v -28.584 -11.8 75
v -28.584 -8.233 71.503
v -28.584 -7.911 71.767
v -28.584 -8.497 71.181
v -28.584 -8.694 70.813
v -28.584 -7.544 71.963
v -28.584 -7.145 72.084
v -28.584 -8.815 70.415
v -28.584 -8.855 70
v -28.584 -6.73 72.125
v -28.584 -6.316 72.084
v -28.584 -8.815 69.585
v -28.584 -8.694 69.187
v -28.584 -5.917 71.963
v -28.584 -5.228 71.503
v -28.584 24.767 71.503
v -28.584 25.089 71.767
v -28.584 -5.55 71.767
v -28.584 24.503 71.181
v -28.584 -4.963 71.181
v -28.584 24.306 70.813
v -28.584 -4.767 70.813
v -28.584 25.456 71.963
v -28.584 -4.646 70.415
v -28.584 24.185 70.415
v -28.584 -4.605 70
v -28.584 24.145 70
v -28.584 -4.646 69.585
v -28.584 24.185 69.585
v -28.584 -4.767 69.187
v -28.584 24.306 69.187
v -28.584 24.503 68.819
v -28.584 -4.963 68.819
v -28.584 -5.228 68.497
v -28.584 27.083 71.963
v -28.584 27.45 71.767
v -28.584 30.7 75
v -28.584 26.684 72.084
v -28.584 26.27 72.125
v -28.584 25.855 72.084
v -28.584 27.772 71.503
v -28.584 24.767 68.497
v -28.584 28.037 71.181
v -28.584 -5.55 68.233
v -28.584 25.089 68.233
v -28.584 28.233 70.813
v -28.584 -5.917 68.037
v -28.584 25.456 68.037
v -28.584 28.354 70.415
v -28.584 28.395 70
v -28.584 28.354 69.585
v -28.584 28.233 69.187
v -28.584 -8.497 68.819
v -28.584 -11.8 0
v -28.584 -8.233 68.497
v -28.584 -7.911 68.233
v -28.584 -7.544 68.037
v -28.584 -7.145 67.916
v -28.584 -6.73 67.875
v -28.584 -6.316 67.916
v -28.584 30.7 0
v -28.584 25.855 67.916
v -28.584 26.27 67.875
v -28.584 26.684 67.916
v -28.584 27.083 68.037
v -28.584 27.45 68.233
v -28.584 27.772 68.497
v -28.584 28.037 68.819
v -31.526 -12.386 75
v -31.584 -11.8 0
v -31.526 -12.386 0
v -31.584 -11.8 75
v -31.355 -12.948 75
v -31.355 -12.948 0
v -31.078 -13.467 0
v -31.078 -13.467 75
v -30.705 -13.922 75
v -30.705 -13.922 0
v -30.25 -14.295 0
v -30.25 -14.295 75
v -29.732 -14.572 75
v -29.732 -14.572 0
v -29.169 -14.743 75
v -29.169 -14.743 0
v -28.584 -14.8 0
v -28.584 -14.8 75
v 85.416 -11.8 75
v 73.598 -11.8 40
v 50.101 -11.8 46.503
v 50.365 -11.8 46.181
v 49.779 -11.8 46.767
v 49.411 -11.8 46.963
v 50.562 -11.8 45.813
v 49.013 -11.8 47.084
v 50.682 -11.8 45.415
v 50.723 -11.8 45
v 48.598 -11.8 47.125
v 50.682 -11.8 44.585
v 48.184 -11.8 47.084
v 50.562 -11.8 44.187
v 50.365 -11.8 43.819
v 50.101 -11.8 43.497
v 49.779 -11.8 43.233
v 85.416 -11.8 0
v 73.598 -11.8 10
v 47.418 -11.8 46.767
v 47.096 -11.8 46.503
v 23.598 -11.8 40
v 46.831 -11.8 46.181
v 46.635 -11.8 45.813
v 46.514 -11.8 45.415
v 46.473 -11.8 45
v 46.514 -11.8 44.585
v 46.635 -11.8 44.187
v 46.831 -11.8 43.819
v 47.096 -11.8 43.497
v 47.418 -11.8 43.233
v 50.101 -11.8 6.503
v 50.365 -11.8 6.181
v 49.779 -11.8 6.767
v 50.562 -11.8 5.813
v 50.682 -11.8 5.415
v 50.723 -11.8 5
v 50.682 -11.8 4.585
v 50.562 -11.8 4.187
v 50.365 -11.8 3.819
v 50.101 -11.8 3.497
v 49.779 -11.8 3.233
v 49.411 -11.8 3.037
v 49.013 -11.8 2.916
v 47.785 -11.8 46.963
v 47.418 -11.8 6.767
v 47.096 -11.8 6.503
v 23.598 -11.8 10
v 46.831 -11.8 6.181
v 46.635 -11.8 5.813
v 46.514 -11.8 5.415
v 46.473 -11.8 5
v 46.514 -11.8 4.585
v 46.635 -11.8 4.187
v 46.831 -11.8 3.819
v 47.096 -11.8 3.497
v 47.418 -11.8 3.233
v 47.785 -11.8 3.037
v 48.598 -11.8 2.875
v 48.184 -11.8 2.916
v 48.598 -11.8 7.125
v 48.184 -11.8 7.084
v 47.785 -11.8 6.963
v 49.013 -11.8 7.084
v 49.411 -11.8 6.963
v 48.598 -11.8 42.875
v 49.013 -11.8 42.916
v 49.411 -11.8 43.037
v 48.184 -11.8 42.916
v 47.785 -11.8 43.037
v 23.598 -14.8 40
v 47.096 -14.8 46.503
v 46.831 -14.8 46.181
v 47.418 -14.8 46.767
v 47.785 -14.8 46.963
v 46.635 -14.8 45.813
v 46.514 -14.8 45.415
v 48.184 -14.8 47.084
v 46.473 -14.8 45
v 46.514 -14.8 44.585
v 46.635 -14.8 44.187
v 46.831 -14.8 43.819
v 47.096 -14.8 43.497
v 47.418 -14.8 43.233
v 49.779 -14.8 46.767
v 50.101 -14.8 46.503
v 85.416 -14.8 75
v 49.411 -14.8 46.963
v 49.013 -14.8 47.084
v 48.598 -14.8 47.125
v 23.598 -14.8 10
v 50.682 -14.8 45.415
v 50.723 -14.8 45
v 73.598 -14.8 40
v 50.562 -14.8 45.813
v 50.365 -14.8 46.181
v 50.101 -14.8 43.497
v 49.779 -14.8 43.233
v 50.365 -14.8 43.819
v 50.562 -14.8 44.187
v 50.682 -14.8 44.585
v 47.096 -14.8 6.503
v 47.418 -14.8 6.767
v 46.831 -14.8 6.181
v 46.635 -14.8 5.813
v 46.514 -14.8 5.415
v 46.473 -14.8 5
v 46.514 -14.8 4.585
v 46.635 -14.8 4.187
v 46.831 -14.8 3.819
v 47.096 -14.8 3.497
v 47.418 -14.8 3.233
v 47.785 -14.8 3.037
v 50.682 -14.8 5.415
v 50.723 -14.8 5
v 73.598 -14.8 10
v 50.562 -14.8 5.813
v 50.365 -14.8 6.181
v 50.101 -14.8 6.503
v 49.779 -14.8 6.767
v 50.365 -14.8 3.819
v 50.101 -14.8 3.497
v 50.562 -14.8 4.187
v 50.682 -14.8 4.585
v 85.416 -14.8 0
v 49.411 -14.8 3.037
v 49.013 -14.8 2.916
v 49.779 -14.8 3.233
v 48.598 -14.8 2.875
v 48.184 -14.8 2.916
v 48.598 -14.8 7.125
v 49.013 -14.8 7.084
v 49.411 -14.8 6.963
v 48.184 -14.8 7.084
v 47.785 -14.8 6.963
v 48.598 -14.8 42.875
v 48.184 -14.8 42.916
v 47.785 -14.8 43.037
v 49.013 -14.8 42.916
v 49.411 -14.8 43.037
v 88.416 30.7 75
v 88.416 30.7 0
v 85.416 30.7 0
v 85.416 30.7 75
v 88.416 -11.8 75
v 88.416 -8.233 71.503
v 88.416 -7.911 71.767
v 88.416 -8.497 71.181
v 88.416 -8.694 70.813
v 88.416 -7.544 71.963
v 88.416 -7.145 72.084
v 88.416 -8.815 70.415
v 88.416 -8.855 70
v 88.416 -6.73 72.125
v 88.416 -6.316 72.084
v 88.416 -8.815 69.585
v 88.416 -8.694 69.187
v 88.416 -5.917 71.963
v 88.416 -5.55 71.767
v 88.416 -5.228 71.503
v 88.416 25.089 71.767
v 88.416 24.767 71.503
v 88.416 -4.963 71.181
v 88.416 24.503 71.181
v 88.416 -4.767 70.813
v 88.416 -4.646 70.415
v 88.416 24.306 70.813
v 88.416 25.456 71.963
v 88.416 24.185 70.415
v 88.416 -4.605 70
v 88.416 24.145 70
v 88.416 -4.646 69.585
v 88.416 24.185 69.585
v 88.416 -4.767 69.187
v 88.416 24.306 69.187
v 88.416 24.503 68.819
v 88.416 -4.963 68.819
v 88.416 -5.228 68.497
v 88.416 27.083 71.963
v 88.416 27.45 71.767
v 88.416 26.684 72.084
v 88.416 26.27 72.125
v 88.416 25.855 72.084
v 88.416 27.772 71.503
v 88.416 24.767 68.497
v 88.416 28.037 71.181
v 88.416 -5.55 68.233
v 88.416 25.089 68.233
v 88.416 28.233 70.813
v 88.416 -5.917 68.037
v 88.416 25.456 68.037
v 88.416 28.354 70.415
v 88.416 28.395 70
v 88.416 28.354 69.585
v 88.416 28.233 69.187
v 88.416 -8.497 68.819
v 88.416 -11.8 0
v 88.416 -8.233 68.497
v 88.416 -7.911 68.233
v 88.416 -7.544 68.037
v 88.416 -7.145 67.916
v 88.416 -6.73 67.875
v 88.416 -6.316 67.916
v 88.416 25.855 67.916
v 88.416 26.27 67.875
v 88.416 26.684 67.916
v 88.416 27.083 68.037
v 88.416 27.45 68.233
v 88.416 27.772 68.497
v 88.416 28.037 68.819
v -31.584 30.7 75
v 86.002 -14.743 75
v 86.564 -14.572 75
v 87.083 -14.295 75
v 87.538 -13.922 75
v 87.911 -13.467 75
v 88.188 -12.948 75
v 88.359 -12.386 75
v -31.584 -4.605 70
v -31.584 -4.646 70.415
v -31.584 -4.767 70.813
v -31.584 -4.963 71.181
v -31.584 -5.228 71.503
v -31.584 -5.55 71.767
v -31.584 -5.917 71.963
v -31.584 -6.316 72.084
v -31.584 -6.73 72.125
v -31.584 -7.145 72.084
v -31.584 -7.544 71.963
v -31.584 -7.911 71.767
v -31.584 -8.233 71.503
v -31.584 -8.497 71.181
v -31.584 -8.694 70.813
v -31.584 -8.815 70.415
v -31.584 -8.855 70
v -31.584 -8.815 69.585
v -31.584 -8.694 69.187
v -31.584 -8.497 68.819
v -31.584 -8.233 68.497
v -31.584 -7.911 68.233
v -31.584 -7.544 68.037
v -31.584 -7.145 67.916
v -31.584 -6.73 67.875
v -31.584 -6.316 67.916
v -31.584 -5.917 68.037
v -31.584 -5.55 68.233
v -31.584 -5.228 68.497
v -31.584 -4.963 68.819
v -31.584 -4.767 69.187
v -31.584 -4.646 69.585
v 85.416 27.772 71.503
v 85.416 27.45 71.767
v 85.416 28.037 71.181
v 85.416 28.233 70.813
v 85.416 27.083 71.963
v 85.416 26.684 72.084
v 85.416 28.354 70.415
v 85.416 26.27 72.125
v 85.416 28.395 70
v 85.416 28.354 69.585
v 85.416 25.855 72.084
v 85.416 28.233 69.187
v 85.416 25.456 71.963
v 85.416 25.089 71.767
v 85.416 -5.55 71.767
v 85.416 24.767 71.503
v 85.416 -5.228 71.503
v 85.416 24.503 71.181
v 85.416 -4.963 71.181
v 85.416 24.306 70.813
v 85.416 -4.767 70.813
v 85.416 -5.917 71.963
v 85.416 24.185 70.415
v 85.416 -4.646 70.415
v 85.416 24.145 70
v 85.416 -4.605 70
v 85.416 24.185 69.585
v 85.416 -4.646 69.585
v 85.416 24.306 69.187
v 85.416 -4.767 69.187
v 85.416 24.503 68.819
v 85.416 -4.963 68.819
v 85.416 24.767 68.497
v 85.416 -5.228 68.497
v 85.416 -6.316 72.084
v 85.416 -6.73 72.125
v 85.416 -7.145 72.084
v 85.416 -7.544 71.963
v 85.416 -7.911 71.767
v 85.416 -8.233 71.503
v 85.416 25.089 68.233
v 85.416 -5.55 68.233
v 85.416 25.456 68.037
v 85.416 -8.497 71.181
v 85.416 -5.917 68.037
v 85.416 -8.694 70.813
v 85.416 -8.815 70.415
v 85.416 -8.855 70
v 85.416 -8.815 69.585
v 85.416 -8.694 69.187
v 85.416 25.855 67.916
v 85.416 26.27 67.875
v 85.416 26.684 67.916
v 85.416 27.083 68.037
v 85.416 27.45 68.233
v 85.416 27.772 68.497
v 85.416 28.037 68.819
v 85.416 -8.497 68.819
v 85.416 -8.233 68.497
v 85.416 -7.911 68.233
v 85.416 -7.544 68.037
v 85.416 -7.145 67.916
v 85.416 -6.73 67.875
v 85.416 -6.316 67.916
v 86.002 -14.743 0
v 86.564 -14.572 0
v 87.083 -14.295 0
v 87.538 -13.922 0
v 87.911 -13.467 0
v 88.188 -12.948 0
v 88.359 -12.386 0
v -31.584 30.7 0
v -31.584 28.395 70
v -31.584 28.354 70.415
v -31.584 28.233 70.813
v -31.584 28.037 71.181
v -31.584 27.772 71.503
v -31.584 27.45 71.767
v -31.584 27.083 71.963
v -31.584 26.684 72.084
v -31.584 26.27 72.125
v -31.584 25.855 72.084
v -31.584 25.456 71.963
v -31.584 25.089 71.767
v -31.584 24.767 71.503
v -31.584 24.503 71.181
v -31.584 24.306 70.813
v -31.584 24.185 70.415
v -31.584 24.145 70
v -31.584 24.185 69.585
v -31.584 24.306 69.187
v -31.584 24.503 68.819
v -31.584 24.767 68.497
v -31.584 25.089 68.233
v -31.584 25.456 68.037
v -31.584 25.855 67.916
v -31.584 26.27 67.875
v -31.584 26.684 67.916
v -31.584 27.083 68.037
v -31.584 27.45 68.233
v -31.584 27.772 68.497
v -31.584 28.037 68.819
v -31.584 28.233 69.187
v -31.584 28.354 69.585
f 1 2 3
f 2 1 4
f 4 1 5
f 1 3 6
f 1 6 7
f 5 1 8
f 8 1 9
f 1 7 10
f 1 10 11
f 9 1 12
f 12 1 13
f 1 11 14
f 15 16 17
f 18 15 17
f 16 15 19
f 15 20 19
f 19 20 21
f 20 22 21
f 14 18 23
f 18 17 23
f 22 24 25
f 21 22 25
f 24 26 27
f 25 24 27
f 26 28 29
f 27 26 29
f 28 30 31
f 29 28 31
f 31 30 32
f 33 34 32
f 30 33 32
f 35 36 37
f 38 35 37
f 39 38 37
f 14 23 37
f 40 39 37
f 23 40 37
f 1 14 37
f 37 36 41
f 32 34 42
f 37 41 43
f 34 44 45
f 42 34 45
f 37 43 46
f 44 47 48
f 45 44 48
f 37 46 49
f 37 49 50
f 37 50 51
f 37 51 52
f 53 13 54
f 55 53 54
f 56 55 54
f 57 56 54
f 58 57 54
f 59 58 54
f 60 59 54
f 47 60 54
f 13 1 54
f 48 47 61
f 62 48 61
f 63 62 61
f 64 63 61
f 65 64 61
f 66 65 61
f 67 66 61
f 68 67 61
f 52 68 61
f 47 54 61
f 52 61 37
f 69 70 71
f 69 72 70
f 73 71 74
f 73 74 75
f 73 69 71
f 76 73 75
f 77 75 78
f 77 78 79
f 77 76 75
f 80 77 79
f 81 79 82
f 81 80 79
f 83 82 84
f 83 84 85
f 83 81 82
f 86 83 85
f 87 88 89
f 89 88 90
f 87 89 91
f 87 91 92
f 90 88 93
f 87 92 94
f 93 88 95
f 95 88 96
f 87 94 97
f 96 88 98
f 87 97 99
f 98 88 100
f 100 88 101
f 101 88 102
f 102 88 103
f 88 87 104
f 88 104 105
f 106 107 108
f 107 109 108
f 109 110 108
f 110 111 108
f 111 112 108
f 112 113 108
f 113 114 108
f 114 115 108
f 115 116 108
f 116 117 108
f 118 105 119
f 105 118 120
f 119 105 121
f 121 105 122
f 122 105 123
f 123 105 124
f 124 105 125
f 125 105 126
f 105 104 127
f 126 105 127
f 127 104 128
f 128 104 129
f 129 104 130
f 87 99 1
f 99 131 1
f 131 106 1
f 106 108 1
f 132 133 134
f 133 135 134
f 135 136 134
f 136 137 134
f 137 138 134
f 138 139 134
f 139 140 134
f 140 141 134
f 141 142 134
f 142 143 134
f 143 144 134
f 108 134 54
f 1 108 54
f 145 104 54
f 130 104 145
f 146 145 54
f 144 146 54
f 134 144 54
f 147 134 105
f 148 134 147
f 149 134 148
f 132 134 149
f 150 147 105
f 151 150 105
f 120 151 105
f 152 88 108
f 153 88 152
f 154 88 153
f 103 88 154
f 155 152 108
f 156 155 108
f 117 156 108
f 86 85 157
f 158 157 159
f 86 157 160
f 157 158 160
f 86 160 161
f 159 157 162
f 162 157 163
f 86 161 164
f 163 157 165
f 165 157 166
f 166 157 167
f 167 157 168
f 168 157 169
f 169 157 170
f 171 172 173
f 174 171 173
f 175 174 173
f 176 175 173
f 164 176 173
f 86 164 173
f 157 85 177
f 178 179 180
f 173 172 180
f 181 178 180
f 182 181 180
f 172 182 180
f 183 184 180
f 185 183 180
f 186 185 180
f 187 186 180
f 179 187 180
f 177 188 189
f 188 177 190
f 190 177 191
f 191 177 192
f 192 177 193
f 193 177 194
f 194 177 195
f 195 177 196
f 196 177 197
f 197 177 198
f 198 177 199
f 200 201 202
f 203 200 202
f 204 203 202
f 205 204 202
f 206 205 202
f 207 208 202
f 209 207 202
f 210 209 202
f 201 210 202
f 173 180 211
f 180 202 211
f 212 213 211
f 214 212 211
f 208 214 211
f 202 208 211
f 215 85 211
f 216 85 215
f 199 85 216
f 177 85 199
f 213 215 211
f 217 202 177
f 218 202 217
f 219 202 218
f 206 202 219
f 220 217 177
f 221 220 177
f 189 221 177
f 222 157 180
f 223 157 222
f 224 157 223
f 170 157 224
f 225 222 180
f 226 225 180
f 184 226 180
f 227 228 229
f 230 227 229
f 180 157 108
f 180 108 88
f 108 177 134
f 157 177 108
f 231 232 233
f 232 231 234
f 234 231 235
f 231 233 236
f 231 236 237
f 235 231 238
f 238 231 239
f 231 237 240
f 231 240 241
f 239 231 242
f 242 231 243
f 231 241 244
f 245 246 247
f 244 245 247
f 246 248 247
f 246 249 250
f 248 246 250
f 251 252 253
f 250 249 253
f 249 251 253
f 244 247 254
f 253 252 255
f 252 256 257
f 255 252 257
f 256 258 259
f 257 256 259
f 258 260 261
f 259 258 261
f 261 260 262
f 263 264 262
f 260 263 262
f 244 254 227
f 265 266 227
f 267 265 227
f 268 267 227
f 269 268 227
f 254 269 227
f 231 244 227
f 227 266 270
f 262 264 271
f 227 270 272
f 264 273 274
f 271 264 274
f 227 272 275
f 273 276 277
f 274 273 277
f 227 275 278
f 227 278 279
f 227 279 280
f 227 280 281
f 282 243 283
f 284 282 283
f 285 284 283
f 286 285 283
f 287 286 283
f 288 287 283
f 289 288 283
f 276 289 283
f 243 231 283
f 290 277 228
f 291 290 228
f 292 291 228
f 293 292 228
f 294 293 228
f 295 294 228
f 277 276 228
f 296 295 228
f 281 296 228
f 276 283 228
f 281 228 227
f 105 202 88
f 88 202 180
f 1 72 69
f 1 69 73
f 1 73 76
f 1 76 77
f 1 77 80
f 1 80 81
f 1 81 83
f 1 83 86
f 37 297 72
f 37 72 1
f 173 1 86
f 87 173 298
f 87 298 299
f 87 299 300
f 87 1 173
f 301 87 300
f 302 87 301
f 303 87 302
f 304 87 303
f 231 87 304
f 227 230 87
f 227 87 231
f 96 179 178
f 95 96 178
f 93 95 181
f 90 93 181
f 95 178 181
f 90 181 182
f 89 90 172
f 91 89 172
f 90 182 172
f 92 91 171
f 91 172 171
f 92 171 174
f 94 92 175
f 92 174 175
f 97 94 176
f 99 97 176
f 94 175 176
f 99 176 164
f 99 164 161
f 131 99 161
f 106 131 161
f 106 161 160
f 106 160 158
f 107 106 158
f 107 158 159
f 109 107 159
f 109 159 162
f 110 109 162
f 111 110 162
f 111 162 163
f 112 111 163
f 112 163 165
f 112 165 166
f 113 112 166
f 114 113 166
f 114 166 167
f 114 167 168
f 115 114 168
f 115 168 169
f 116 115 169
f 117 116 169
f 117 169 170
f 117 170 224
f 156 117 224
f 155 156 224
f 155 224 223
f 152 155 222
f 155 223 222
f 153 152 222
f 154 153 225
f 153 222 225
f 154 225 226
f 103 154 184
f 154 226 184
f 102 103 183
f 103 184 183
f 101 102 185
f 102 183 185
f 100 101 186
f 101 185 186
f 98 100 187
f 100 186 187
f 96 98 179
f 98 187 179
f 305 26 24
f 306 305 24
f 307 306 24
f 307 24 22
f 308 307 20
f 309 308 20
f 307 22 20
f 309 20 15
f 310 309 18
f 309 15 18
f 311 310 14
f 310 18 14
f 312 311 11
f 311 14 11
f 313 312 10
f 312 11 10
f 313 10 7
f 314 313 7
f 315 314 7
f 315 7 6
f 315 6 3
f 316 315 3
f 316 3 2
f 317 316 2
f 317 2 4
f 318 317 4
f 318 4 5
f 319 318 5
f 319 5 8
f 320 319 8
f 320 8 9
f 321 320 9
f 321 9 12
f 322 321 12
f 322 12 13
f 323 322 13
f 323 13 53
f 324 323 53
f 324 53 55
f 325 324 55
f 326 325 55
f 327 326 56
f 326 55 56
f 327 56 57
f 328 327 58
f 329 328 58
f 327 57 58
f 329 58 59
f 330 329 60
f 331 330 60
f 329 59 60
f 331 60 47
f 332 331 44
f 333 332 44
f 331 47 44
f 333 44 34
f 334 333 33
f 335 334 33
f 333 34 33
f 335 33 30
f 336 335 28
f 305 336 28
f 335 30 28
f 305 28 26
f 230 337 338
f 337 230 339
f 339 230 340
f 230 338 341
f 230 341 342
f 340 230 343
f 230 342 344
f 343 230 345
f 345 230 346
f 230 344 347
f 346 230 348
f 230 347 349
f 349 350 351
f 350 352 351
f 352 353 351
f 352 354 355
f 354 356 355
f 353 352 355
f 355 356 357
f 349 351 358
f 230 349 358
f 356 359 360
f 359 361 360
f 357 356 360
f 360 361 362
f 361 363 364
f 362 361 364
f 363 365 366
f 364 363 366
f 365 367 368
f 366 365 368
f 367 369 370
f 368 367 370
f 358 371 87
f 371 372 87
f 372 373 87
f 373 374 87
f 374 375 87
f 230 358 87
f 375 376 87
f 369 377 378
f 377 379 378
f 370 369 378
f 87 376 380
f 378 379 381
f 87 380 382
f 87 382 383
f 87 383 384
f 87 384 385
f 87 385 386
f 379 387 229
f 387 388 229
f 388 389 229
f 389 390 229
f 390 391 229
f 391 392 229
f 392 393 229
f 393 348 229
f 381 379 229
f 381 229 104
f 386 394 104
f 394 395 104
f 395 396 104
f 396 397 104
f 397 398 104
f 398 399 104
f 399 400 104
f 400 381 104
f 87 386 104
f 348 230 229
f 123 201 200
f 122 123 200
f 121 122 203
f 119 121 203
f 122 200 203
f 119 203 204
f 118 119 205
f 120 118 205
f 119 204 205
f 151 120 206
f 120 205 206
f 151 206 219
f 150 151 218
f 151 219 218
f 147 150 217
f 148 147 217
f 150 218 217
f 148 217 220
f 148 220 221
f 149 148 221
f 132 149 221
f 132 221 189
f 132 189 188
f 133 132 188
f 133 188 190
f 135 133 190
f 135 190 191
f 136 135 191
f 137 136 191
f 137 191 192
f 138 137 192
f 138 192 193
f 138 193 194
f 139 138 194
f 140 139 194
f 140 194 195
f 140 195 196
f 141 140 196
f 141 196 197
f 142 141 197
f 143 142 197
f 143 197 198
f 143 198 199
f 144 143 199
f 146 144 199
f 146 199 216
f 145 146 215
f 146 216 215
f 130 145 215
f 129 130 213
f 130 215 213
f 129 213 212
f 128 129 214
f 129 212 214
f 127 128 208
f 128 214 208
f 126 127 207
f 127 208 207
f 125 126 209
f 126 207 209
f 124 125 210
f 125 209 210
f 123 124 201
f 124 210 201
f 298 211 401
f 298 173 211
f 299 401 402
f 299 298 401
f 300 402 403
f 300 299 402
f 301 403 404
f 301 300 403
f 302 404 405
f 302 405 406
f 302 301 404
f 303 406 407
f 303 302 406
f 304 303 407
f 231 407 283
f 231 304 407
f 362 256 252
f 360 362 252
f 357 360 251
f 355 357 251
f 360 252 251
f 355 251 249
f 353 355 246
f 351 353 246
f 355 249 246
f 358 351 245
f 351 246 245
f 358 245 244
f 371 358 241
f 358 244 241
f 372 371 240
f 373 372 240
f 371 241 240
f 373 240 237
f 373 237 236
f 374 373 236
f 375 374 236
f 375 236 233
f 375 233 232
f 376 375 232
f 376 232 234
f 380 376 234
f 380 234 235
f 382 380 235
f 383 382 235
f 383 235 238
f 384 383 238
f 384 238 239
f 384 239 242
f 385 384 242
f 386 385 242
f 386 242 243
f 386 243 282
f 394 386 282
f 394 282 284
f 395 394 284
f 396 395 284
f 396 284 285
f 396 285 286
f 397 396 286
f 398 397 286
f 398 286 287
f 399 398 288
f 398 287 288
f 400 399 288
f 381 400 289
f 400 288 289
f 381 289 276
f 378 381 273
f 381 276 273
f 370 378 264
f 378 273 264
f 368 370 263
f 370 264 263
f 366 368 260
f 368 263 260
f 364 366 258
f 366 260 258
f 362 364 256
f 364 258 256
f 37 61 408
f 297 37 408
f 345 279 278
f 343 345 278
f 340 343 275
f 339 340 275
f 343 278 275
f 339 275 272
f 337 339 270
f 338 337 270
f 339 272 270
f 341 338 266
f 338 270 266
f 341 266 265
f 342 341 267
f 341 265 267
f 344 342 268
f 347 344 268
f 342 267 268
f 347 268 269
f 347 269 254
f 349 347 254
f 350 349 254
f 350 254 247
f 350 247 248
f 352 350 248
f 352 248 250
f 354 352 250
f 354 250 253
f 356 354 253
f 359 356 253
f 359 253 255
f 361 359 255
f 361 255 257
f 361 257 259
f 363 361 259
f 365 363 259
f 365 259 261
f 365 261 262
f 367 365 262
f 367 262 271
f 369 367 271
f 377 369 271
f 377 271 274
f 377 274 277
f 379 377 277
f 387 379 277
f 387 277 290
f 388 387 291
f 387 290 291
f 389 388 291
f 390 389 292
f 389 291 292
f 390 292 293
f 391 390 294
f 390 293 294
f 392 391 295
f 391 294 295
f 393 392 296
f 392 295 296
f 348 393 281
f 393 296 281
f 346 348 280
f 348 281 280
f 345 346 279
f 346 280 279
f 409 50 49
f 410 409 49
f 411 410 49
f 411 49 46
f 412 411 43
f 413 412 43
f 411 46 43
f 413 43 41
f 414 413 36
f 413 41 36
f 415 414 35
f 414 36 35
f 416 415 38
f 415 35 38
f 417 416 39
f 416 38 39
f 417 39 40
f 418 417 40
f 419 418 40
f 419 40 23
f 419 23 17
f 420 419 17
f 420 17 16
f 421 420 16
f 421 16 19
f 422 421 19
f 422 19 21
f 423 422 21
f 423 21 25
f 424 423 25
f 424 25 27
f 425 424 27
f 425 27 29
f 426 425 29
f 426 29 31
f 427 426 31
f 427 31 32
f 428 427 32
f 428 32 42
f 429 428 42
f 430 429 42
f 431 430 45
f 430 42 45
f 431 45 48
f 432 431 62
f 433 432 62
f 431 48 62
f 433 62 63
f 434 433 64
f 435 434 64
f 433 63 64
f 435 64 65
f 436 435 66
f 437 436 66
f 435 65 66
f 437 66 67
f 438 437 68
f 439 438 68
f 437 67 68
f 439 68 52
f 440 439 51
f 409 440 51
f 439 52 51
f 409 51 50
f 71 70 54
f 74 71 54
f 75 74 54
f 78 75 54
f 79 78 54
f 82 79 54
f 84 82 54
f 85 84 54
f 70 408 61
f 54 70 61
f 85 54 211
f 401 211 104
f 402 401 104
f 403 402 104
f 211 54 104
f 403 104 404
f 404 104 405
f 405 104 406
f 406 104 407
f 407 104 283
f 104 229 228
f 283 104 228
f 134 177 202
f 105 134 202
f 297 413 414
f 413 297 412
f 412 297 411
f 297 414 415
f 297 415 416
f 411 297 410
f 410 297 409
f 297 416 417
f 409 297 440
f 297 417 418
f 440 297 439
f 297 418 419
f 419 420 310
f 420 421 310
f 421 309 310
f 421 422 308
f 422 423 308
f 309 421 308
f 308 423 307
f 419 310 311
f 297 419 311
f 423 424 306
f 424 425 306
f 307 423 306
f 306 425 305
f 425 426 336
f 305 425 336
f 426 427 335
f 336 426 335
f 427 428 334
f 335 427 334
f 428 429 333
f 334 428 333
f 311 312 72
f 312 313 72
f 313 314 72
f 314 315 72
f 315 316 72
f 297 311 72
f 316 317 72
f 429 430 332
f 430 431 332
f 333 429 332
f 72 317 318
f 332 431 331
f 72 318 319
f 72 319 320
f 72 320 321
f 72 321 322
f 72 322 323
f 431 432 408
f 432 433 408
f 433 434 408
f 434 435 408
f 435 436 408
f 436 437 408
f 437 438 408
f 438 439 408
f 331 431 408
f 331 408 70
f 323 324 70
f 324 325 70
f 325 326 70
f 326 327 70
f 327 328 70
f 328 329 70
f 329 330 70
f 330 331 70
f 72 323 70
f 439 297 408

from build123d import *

# Parameters (mm, degrees)
F1_DEPTH = 75
F2_R     = 2.125
F2_W     = 50
F2_H     = 30
F3_DEPTH = 5
F5_R     = 2.125
F6_DEPTH = 130
F7_R     = 3


with BuildPart() as f1:
    # F0 (on Top) → F1 (new body)
    with BuildSketch(Plane.XY):
        Polygon((-28.58369, -11.800445), (-28.58369, 30.699555), (-30.356892, 30.699555), (-31.58369, 30.699555), (-31.58369, -14.800445), (-27.58369, -14.800445), (84.41631, -14.800445), (88.41631, -14.800445), (88.41631, 30.699555), (87.189512, 30.699555), (85.41631, 30.699555), (85.41631, -11.800445), align=None)
    extrude(amount=F1_DEPTH)

    # F2 (on face) → F3 (cut)
    with BuildSketch(Plane.XZ.offset(14.800445)):
        with Locations((48.598289, 45)):
            Circle(F2_R)
        with Locations((48.598289, 5)):
            Circle(F2_R)
        with Locations((48.598289, 25)):
            Rectangle(F2_W, F2_H)
    extrude(amount=-F3_DEPTH, mode=Mode.SUBTRACT)

    # F5 (on face) → F6 (cut)
    with BuildSketch(Plane.YZ.offset(88.41631)):
        with Locations((-6.730337, 70)):
            Circle(F5_R)
        with Locations((26.269663, 70)):
            Circle(F5_R)
    extrude(amount=-F6_DEPTH, mode=Mode.SUBTRACT)

    # F7
    f7_edges = [f1.edges().sort_by_distance(p)[0] for p in [
        (88.41631, -14.800445, 37.5),
        (-31.58369, -14.800445, 37.5),
    ]]
    fillet(f7_edges, radius=F7_R)


solid = f1.part
